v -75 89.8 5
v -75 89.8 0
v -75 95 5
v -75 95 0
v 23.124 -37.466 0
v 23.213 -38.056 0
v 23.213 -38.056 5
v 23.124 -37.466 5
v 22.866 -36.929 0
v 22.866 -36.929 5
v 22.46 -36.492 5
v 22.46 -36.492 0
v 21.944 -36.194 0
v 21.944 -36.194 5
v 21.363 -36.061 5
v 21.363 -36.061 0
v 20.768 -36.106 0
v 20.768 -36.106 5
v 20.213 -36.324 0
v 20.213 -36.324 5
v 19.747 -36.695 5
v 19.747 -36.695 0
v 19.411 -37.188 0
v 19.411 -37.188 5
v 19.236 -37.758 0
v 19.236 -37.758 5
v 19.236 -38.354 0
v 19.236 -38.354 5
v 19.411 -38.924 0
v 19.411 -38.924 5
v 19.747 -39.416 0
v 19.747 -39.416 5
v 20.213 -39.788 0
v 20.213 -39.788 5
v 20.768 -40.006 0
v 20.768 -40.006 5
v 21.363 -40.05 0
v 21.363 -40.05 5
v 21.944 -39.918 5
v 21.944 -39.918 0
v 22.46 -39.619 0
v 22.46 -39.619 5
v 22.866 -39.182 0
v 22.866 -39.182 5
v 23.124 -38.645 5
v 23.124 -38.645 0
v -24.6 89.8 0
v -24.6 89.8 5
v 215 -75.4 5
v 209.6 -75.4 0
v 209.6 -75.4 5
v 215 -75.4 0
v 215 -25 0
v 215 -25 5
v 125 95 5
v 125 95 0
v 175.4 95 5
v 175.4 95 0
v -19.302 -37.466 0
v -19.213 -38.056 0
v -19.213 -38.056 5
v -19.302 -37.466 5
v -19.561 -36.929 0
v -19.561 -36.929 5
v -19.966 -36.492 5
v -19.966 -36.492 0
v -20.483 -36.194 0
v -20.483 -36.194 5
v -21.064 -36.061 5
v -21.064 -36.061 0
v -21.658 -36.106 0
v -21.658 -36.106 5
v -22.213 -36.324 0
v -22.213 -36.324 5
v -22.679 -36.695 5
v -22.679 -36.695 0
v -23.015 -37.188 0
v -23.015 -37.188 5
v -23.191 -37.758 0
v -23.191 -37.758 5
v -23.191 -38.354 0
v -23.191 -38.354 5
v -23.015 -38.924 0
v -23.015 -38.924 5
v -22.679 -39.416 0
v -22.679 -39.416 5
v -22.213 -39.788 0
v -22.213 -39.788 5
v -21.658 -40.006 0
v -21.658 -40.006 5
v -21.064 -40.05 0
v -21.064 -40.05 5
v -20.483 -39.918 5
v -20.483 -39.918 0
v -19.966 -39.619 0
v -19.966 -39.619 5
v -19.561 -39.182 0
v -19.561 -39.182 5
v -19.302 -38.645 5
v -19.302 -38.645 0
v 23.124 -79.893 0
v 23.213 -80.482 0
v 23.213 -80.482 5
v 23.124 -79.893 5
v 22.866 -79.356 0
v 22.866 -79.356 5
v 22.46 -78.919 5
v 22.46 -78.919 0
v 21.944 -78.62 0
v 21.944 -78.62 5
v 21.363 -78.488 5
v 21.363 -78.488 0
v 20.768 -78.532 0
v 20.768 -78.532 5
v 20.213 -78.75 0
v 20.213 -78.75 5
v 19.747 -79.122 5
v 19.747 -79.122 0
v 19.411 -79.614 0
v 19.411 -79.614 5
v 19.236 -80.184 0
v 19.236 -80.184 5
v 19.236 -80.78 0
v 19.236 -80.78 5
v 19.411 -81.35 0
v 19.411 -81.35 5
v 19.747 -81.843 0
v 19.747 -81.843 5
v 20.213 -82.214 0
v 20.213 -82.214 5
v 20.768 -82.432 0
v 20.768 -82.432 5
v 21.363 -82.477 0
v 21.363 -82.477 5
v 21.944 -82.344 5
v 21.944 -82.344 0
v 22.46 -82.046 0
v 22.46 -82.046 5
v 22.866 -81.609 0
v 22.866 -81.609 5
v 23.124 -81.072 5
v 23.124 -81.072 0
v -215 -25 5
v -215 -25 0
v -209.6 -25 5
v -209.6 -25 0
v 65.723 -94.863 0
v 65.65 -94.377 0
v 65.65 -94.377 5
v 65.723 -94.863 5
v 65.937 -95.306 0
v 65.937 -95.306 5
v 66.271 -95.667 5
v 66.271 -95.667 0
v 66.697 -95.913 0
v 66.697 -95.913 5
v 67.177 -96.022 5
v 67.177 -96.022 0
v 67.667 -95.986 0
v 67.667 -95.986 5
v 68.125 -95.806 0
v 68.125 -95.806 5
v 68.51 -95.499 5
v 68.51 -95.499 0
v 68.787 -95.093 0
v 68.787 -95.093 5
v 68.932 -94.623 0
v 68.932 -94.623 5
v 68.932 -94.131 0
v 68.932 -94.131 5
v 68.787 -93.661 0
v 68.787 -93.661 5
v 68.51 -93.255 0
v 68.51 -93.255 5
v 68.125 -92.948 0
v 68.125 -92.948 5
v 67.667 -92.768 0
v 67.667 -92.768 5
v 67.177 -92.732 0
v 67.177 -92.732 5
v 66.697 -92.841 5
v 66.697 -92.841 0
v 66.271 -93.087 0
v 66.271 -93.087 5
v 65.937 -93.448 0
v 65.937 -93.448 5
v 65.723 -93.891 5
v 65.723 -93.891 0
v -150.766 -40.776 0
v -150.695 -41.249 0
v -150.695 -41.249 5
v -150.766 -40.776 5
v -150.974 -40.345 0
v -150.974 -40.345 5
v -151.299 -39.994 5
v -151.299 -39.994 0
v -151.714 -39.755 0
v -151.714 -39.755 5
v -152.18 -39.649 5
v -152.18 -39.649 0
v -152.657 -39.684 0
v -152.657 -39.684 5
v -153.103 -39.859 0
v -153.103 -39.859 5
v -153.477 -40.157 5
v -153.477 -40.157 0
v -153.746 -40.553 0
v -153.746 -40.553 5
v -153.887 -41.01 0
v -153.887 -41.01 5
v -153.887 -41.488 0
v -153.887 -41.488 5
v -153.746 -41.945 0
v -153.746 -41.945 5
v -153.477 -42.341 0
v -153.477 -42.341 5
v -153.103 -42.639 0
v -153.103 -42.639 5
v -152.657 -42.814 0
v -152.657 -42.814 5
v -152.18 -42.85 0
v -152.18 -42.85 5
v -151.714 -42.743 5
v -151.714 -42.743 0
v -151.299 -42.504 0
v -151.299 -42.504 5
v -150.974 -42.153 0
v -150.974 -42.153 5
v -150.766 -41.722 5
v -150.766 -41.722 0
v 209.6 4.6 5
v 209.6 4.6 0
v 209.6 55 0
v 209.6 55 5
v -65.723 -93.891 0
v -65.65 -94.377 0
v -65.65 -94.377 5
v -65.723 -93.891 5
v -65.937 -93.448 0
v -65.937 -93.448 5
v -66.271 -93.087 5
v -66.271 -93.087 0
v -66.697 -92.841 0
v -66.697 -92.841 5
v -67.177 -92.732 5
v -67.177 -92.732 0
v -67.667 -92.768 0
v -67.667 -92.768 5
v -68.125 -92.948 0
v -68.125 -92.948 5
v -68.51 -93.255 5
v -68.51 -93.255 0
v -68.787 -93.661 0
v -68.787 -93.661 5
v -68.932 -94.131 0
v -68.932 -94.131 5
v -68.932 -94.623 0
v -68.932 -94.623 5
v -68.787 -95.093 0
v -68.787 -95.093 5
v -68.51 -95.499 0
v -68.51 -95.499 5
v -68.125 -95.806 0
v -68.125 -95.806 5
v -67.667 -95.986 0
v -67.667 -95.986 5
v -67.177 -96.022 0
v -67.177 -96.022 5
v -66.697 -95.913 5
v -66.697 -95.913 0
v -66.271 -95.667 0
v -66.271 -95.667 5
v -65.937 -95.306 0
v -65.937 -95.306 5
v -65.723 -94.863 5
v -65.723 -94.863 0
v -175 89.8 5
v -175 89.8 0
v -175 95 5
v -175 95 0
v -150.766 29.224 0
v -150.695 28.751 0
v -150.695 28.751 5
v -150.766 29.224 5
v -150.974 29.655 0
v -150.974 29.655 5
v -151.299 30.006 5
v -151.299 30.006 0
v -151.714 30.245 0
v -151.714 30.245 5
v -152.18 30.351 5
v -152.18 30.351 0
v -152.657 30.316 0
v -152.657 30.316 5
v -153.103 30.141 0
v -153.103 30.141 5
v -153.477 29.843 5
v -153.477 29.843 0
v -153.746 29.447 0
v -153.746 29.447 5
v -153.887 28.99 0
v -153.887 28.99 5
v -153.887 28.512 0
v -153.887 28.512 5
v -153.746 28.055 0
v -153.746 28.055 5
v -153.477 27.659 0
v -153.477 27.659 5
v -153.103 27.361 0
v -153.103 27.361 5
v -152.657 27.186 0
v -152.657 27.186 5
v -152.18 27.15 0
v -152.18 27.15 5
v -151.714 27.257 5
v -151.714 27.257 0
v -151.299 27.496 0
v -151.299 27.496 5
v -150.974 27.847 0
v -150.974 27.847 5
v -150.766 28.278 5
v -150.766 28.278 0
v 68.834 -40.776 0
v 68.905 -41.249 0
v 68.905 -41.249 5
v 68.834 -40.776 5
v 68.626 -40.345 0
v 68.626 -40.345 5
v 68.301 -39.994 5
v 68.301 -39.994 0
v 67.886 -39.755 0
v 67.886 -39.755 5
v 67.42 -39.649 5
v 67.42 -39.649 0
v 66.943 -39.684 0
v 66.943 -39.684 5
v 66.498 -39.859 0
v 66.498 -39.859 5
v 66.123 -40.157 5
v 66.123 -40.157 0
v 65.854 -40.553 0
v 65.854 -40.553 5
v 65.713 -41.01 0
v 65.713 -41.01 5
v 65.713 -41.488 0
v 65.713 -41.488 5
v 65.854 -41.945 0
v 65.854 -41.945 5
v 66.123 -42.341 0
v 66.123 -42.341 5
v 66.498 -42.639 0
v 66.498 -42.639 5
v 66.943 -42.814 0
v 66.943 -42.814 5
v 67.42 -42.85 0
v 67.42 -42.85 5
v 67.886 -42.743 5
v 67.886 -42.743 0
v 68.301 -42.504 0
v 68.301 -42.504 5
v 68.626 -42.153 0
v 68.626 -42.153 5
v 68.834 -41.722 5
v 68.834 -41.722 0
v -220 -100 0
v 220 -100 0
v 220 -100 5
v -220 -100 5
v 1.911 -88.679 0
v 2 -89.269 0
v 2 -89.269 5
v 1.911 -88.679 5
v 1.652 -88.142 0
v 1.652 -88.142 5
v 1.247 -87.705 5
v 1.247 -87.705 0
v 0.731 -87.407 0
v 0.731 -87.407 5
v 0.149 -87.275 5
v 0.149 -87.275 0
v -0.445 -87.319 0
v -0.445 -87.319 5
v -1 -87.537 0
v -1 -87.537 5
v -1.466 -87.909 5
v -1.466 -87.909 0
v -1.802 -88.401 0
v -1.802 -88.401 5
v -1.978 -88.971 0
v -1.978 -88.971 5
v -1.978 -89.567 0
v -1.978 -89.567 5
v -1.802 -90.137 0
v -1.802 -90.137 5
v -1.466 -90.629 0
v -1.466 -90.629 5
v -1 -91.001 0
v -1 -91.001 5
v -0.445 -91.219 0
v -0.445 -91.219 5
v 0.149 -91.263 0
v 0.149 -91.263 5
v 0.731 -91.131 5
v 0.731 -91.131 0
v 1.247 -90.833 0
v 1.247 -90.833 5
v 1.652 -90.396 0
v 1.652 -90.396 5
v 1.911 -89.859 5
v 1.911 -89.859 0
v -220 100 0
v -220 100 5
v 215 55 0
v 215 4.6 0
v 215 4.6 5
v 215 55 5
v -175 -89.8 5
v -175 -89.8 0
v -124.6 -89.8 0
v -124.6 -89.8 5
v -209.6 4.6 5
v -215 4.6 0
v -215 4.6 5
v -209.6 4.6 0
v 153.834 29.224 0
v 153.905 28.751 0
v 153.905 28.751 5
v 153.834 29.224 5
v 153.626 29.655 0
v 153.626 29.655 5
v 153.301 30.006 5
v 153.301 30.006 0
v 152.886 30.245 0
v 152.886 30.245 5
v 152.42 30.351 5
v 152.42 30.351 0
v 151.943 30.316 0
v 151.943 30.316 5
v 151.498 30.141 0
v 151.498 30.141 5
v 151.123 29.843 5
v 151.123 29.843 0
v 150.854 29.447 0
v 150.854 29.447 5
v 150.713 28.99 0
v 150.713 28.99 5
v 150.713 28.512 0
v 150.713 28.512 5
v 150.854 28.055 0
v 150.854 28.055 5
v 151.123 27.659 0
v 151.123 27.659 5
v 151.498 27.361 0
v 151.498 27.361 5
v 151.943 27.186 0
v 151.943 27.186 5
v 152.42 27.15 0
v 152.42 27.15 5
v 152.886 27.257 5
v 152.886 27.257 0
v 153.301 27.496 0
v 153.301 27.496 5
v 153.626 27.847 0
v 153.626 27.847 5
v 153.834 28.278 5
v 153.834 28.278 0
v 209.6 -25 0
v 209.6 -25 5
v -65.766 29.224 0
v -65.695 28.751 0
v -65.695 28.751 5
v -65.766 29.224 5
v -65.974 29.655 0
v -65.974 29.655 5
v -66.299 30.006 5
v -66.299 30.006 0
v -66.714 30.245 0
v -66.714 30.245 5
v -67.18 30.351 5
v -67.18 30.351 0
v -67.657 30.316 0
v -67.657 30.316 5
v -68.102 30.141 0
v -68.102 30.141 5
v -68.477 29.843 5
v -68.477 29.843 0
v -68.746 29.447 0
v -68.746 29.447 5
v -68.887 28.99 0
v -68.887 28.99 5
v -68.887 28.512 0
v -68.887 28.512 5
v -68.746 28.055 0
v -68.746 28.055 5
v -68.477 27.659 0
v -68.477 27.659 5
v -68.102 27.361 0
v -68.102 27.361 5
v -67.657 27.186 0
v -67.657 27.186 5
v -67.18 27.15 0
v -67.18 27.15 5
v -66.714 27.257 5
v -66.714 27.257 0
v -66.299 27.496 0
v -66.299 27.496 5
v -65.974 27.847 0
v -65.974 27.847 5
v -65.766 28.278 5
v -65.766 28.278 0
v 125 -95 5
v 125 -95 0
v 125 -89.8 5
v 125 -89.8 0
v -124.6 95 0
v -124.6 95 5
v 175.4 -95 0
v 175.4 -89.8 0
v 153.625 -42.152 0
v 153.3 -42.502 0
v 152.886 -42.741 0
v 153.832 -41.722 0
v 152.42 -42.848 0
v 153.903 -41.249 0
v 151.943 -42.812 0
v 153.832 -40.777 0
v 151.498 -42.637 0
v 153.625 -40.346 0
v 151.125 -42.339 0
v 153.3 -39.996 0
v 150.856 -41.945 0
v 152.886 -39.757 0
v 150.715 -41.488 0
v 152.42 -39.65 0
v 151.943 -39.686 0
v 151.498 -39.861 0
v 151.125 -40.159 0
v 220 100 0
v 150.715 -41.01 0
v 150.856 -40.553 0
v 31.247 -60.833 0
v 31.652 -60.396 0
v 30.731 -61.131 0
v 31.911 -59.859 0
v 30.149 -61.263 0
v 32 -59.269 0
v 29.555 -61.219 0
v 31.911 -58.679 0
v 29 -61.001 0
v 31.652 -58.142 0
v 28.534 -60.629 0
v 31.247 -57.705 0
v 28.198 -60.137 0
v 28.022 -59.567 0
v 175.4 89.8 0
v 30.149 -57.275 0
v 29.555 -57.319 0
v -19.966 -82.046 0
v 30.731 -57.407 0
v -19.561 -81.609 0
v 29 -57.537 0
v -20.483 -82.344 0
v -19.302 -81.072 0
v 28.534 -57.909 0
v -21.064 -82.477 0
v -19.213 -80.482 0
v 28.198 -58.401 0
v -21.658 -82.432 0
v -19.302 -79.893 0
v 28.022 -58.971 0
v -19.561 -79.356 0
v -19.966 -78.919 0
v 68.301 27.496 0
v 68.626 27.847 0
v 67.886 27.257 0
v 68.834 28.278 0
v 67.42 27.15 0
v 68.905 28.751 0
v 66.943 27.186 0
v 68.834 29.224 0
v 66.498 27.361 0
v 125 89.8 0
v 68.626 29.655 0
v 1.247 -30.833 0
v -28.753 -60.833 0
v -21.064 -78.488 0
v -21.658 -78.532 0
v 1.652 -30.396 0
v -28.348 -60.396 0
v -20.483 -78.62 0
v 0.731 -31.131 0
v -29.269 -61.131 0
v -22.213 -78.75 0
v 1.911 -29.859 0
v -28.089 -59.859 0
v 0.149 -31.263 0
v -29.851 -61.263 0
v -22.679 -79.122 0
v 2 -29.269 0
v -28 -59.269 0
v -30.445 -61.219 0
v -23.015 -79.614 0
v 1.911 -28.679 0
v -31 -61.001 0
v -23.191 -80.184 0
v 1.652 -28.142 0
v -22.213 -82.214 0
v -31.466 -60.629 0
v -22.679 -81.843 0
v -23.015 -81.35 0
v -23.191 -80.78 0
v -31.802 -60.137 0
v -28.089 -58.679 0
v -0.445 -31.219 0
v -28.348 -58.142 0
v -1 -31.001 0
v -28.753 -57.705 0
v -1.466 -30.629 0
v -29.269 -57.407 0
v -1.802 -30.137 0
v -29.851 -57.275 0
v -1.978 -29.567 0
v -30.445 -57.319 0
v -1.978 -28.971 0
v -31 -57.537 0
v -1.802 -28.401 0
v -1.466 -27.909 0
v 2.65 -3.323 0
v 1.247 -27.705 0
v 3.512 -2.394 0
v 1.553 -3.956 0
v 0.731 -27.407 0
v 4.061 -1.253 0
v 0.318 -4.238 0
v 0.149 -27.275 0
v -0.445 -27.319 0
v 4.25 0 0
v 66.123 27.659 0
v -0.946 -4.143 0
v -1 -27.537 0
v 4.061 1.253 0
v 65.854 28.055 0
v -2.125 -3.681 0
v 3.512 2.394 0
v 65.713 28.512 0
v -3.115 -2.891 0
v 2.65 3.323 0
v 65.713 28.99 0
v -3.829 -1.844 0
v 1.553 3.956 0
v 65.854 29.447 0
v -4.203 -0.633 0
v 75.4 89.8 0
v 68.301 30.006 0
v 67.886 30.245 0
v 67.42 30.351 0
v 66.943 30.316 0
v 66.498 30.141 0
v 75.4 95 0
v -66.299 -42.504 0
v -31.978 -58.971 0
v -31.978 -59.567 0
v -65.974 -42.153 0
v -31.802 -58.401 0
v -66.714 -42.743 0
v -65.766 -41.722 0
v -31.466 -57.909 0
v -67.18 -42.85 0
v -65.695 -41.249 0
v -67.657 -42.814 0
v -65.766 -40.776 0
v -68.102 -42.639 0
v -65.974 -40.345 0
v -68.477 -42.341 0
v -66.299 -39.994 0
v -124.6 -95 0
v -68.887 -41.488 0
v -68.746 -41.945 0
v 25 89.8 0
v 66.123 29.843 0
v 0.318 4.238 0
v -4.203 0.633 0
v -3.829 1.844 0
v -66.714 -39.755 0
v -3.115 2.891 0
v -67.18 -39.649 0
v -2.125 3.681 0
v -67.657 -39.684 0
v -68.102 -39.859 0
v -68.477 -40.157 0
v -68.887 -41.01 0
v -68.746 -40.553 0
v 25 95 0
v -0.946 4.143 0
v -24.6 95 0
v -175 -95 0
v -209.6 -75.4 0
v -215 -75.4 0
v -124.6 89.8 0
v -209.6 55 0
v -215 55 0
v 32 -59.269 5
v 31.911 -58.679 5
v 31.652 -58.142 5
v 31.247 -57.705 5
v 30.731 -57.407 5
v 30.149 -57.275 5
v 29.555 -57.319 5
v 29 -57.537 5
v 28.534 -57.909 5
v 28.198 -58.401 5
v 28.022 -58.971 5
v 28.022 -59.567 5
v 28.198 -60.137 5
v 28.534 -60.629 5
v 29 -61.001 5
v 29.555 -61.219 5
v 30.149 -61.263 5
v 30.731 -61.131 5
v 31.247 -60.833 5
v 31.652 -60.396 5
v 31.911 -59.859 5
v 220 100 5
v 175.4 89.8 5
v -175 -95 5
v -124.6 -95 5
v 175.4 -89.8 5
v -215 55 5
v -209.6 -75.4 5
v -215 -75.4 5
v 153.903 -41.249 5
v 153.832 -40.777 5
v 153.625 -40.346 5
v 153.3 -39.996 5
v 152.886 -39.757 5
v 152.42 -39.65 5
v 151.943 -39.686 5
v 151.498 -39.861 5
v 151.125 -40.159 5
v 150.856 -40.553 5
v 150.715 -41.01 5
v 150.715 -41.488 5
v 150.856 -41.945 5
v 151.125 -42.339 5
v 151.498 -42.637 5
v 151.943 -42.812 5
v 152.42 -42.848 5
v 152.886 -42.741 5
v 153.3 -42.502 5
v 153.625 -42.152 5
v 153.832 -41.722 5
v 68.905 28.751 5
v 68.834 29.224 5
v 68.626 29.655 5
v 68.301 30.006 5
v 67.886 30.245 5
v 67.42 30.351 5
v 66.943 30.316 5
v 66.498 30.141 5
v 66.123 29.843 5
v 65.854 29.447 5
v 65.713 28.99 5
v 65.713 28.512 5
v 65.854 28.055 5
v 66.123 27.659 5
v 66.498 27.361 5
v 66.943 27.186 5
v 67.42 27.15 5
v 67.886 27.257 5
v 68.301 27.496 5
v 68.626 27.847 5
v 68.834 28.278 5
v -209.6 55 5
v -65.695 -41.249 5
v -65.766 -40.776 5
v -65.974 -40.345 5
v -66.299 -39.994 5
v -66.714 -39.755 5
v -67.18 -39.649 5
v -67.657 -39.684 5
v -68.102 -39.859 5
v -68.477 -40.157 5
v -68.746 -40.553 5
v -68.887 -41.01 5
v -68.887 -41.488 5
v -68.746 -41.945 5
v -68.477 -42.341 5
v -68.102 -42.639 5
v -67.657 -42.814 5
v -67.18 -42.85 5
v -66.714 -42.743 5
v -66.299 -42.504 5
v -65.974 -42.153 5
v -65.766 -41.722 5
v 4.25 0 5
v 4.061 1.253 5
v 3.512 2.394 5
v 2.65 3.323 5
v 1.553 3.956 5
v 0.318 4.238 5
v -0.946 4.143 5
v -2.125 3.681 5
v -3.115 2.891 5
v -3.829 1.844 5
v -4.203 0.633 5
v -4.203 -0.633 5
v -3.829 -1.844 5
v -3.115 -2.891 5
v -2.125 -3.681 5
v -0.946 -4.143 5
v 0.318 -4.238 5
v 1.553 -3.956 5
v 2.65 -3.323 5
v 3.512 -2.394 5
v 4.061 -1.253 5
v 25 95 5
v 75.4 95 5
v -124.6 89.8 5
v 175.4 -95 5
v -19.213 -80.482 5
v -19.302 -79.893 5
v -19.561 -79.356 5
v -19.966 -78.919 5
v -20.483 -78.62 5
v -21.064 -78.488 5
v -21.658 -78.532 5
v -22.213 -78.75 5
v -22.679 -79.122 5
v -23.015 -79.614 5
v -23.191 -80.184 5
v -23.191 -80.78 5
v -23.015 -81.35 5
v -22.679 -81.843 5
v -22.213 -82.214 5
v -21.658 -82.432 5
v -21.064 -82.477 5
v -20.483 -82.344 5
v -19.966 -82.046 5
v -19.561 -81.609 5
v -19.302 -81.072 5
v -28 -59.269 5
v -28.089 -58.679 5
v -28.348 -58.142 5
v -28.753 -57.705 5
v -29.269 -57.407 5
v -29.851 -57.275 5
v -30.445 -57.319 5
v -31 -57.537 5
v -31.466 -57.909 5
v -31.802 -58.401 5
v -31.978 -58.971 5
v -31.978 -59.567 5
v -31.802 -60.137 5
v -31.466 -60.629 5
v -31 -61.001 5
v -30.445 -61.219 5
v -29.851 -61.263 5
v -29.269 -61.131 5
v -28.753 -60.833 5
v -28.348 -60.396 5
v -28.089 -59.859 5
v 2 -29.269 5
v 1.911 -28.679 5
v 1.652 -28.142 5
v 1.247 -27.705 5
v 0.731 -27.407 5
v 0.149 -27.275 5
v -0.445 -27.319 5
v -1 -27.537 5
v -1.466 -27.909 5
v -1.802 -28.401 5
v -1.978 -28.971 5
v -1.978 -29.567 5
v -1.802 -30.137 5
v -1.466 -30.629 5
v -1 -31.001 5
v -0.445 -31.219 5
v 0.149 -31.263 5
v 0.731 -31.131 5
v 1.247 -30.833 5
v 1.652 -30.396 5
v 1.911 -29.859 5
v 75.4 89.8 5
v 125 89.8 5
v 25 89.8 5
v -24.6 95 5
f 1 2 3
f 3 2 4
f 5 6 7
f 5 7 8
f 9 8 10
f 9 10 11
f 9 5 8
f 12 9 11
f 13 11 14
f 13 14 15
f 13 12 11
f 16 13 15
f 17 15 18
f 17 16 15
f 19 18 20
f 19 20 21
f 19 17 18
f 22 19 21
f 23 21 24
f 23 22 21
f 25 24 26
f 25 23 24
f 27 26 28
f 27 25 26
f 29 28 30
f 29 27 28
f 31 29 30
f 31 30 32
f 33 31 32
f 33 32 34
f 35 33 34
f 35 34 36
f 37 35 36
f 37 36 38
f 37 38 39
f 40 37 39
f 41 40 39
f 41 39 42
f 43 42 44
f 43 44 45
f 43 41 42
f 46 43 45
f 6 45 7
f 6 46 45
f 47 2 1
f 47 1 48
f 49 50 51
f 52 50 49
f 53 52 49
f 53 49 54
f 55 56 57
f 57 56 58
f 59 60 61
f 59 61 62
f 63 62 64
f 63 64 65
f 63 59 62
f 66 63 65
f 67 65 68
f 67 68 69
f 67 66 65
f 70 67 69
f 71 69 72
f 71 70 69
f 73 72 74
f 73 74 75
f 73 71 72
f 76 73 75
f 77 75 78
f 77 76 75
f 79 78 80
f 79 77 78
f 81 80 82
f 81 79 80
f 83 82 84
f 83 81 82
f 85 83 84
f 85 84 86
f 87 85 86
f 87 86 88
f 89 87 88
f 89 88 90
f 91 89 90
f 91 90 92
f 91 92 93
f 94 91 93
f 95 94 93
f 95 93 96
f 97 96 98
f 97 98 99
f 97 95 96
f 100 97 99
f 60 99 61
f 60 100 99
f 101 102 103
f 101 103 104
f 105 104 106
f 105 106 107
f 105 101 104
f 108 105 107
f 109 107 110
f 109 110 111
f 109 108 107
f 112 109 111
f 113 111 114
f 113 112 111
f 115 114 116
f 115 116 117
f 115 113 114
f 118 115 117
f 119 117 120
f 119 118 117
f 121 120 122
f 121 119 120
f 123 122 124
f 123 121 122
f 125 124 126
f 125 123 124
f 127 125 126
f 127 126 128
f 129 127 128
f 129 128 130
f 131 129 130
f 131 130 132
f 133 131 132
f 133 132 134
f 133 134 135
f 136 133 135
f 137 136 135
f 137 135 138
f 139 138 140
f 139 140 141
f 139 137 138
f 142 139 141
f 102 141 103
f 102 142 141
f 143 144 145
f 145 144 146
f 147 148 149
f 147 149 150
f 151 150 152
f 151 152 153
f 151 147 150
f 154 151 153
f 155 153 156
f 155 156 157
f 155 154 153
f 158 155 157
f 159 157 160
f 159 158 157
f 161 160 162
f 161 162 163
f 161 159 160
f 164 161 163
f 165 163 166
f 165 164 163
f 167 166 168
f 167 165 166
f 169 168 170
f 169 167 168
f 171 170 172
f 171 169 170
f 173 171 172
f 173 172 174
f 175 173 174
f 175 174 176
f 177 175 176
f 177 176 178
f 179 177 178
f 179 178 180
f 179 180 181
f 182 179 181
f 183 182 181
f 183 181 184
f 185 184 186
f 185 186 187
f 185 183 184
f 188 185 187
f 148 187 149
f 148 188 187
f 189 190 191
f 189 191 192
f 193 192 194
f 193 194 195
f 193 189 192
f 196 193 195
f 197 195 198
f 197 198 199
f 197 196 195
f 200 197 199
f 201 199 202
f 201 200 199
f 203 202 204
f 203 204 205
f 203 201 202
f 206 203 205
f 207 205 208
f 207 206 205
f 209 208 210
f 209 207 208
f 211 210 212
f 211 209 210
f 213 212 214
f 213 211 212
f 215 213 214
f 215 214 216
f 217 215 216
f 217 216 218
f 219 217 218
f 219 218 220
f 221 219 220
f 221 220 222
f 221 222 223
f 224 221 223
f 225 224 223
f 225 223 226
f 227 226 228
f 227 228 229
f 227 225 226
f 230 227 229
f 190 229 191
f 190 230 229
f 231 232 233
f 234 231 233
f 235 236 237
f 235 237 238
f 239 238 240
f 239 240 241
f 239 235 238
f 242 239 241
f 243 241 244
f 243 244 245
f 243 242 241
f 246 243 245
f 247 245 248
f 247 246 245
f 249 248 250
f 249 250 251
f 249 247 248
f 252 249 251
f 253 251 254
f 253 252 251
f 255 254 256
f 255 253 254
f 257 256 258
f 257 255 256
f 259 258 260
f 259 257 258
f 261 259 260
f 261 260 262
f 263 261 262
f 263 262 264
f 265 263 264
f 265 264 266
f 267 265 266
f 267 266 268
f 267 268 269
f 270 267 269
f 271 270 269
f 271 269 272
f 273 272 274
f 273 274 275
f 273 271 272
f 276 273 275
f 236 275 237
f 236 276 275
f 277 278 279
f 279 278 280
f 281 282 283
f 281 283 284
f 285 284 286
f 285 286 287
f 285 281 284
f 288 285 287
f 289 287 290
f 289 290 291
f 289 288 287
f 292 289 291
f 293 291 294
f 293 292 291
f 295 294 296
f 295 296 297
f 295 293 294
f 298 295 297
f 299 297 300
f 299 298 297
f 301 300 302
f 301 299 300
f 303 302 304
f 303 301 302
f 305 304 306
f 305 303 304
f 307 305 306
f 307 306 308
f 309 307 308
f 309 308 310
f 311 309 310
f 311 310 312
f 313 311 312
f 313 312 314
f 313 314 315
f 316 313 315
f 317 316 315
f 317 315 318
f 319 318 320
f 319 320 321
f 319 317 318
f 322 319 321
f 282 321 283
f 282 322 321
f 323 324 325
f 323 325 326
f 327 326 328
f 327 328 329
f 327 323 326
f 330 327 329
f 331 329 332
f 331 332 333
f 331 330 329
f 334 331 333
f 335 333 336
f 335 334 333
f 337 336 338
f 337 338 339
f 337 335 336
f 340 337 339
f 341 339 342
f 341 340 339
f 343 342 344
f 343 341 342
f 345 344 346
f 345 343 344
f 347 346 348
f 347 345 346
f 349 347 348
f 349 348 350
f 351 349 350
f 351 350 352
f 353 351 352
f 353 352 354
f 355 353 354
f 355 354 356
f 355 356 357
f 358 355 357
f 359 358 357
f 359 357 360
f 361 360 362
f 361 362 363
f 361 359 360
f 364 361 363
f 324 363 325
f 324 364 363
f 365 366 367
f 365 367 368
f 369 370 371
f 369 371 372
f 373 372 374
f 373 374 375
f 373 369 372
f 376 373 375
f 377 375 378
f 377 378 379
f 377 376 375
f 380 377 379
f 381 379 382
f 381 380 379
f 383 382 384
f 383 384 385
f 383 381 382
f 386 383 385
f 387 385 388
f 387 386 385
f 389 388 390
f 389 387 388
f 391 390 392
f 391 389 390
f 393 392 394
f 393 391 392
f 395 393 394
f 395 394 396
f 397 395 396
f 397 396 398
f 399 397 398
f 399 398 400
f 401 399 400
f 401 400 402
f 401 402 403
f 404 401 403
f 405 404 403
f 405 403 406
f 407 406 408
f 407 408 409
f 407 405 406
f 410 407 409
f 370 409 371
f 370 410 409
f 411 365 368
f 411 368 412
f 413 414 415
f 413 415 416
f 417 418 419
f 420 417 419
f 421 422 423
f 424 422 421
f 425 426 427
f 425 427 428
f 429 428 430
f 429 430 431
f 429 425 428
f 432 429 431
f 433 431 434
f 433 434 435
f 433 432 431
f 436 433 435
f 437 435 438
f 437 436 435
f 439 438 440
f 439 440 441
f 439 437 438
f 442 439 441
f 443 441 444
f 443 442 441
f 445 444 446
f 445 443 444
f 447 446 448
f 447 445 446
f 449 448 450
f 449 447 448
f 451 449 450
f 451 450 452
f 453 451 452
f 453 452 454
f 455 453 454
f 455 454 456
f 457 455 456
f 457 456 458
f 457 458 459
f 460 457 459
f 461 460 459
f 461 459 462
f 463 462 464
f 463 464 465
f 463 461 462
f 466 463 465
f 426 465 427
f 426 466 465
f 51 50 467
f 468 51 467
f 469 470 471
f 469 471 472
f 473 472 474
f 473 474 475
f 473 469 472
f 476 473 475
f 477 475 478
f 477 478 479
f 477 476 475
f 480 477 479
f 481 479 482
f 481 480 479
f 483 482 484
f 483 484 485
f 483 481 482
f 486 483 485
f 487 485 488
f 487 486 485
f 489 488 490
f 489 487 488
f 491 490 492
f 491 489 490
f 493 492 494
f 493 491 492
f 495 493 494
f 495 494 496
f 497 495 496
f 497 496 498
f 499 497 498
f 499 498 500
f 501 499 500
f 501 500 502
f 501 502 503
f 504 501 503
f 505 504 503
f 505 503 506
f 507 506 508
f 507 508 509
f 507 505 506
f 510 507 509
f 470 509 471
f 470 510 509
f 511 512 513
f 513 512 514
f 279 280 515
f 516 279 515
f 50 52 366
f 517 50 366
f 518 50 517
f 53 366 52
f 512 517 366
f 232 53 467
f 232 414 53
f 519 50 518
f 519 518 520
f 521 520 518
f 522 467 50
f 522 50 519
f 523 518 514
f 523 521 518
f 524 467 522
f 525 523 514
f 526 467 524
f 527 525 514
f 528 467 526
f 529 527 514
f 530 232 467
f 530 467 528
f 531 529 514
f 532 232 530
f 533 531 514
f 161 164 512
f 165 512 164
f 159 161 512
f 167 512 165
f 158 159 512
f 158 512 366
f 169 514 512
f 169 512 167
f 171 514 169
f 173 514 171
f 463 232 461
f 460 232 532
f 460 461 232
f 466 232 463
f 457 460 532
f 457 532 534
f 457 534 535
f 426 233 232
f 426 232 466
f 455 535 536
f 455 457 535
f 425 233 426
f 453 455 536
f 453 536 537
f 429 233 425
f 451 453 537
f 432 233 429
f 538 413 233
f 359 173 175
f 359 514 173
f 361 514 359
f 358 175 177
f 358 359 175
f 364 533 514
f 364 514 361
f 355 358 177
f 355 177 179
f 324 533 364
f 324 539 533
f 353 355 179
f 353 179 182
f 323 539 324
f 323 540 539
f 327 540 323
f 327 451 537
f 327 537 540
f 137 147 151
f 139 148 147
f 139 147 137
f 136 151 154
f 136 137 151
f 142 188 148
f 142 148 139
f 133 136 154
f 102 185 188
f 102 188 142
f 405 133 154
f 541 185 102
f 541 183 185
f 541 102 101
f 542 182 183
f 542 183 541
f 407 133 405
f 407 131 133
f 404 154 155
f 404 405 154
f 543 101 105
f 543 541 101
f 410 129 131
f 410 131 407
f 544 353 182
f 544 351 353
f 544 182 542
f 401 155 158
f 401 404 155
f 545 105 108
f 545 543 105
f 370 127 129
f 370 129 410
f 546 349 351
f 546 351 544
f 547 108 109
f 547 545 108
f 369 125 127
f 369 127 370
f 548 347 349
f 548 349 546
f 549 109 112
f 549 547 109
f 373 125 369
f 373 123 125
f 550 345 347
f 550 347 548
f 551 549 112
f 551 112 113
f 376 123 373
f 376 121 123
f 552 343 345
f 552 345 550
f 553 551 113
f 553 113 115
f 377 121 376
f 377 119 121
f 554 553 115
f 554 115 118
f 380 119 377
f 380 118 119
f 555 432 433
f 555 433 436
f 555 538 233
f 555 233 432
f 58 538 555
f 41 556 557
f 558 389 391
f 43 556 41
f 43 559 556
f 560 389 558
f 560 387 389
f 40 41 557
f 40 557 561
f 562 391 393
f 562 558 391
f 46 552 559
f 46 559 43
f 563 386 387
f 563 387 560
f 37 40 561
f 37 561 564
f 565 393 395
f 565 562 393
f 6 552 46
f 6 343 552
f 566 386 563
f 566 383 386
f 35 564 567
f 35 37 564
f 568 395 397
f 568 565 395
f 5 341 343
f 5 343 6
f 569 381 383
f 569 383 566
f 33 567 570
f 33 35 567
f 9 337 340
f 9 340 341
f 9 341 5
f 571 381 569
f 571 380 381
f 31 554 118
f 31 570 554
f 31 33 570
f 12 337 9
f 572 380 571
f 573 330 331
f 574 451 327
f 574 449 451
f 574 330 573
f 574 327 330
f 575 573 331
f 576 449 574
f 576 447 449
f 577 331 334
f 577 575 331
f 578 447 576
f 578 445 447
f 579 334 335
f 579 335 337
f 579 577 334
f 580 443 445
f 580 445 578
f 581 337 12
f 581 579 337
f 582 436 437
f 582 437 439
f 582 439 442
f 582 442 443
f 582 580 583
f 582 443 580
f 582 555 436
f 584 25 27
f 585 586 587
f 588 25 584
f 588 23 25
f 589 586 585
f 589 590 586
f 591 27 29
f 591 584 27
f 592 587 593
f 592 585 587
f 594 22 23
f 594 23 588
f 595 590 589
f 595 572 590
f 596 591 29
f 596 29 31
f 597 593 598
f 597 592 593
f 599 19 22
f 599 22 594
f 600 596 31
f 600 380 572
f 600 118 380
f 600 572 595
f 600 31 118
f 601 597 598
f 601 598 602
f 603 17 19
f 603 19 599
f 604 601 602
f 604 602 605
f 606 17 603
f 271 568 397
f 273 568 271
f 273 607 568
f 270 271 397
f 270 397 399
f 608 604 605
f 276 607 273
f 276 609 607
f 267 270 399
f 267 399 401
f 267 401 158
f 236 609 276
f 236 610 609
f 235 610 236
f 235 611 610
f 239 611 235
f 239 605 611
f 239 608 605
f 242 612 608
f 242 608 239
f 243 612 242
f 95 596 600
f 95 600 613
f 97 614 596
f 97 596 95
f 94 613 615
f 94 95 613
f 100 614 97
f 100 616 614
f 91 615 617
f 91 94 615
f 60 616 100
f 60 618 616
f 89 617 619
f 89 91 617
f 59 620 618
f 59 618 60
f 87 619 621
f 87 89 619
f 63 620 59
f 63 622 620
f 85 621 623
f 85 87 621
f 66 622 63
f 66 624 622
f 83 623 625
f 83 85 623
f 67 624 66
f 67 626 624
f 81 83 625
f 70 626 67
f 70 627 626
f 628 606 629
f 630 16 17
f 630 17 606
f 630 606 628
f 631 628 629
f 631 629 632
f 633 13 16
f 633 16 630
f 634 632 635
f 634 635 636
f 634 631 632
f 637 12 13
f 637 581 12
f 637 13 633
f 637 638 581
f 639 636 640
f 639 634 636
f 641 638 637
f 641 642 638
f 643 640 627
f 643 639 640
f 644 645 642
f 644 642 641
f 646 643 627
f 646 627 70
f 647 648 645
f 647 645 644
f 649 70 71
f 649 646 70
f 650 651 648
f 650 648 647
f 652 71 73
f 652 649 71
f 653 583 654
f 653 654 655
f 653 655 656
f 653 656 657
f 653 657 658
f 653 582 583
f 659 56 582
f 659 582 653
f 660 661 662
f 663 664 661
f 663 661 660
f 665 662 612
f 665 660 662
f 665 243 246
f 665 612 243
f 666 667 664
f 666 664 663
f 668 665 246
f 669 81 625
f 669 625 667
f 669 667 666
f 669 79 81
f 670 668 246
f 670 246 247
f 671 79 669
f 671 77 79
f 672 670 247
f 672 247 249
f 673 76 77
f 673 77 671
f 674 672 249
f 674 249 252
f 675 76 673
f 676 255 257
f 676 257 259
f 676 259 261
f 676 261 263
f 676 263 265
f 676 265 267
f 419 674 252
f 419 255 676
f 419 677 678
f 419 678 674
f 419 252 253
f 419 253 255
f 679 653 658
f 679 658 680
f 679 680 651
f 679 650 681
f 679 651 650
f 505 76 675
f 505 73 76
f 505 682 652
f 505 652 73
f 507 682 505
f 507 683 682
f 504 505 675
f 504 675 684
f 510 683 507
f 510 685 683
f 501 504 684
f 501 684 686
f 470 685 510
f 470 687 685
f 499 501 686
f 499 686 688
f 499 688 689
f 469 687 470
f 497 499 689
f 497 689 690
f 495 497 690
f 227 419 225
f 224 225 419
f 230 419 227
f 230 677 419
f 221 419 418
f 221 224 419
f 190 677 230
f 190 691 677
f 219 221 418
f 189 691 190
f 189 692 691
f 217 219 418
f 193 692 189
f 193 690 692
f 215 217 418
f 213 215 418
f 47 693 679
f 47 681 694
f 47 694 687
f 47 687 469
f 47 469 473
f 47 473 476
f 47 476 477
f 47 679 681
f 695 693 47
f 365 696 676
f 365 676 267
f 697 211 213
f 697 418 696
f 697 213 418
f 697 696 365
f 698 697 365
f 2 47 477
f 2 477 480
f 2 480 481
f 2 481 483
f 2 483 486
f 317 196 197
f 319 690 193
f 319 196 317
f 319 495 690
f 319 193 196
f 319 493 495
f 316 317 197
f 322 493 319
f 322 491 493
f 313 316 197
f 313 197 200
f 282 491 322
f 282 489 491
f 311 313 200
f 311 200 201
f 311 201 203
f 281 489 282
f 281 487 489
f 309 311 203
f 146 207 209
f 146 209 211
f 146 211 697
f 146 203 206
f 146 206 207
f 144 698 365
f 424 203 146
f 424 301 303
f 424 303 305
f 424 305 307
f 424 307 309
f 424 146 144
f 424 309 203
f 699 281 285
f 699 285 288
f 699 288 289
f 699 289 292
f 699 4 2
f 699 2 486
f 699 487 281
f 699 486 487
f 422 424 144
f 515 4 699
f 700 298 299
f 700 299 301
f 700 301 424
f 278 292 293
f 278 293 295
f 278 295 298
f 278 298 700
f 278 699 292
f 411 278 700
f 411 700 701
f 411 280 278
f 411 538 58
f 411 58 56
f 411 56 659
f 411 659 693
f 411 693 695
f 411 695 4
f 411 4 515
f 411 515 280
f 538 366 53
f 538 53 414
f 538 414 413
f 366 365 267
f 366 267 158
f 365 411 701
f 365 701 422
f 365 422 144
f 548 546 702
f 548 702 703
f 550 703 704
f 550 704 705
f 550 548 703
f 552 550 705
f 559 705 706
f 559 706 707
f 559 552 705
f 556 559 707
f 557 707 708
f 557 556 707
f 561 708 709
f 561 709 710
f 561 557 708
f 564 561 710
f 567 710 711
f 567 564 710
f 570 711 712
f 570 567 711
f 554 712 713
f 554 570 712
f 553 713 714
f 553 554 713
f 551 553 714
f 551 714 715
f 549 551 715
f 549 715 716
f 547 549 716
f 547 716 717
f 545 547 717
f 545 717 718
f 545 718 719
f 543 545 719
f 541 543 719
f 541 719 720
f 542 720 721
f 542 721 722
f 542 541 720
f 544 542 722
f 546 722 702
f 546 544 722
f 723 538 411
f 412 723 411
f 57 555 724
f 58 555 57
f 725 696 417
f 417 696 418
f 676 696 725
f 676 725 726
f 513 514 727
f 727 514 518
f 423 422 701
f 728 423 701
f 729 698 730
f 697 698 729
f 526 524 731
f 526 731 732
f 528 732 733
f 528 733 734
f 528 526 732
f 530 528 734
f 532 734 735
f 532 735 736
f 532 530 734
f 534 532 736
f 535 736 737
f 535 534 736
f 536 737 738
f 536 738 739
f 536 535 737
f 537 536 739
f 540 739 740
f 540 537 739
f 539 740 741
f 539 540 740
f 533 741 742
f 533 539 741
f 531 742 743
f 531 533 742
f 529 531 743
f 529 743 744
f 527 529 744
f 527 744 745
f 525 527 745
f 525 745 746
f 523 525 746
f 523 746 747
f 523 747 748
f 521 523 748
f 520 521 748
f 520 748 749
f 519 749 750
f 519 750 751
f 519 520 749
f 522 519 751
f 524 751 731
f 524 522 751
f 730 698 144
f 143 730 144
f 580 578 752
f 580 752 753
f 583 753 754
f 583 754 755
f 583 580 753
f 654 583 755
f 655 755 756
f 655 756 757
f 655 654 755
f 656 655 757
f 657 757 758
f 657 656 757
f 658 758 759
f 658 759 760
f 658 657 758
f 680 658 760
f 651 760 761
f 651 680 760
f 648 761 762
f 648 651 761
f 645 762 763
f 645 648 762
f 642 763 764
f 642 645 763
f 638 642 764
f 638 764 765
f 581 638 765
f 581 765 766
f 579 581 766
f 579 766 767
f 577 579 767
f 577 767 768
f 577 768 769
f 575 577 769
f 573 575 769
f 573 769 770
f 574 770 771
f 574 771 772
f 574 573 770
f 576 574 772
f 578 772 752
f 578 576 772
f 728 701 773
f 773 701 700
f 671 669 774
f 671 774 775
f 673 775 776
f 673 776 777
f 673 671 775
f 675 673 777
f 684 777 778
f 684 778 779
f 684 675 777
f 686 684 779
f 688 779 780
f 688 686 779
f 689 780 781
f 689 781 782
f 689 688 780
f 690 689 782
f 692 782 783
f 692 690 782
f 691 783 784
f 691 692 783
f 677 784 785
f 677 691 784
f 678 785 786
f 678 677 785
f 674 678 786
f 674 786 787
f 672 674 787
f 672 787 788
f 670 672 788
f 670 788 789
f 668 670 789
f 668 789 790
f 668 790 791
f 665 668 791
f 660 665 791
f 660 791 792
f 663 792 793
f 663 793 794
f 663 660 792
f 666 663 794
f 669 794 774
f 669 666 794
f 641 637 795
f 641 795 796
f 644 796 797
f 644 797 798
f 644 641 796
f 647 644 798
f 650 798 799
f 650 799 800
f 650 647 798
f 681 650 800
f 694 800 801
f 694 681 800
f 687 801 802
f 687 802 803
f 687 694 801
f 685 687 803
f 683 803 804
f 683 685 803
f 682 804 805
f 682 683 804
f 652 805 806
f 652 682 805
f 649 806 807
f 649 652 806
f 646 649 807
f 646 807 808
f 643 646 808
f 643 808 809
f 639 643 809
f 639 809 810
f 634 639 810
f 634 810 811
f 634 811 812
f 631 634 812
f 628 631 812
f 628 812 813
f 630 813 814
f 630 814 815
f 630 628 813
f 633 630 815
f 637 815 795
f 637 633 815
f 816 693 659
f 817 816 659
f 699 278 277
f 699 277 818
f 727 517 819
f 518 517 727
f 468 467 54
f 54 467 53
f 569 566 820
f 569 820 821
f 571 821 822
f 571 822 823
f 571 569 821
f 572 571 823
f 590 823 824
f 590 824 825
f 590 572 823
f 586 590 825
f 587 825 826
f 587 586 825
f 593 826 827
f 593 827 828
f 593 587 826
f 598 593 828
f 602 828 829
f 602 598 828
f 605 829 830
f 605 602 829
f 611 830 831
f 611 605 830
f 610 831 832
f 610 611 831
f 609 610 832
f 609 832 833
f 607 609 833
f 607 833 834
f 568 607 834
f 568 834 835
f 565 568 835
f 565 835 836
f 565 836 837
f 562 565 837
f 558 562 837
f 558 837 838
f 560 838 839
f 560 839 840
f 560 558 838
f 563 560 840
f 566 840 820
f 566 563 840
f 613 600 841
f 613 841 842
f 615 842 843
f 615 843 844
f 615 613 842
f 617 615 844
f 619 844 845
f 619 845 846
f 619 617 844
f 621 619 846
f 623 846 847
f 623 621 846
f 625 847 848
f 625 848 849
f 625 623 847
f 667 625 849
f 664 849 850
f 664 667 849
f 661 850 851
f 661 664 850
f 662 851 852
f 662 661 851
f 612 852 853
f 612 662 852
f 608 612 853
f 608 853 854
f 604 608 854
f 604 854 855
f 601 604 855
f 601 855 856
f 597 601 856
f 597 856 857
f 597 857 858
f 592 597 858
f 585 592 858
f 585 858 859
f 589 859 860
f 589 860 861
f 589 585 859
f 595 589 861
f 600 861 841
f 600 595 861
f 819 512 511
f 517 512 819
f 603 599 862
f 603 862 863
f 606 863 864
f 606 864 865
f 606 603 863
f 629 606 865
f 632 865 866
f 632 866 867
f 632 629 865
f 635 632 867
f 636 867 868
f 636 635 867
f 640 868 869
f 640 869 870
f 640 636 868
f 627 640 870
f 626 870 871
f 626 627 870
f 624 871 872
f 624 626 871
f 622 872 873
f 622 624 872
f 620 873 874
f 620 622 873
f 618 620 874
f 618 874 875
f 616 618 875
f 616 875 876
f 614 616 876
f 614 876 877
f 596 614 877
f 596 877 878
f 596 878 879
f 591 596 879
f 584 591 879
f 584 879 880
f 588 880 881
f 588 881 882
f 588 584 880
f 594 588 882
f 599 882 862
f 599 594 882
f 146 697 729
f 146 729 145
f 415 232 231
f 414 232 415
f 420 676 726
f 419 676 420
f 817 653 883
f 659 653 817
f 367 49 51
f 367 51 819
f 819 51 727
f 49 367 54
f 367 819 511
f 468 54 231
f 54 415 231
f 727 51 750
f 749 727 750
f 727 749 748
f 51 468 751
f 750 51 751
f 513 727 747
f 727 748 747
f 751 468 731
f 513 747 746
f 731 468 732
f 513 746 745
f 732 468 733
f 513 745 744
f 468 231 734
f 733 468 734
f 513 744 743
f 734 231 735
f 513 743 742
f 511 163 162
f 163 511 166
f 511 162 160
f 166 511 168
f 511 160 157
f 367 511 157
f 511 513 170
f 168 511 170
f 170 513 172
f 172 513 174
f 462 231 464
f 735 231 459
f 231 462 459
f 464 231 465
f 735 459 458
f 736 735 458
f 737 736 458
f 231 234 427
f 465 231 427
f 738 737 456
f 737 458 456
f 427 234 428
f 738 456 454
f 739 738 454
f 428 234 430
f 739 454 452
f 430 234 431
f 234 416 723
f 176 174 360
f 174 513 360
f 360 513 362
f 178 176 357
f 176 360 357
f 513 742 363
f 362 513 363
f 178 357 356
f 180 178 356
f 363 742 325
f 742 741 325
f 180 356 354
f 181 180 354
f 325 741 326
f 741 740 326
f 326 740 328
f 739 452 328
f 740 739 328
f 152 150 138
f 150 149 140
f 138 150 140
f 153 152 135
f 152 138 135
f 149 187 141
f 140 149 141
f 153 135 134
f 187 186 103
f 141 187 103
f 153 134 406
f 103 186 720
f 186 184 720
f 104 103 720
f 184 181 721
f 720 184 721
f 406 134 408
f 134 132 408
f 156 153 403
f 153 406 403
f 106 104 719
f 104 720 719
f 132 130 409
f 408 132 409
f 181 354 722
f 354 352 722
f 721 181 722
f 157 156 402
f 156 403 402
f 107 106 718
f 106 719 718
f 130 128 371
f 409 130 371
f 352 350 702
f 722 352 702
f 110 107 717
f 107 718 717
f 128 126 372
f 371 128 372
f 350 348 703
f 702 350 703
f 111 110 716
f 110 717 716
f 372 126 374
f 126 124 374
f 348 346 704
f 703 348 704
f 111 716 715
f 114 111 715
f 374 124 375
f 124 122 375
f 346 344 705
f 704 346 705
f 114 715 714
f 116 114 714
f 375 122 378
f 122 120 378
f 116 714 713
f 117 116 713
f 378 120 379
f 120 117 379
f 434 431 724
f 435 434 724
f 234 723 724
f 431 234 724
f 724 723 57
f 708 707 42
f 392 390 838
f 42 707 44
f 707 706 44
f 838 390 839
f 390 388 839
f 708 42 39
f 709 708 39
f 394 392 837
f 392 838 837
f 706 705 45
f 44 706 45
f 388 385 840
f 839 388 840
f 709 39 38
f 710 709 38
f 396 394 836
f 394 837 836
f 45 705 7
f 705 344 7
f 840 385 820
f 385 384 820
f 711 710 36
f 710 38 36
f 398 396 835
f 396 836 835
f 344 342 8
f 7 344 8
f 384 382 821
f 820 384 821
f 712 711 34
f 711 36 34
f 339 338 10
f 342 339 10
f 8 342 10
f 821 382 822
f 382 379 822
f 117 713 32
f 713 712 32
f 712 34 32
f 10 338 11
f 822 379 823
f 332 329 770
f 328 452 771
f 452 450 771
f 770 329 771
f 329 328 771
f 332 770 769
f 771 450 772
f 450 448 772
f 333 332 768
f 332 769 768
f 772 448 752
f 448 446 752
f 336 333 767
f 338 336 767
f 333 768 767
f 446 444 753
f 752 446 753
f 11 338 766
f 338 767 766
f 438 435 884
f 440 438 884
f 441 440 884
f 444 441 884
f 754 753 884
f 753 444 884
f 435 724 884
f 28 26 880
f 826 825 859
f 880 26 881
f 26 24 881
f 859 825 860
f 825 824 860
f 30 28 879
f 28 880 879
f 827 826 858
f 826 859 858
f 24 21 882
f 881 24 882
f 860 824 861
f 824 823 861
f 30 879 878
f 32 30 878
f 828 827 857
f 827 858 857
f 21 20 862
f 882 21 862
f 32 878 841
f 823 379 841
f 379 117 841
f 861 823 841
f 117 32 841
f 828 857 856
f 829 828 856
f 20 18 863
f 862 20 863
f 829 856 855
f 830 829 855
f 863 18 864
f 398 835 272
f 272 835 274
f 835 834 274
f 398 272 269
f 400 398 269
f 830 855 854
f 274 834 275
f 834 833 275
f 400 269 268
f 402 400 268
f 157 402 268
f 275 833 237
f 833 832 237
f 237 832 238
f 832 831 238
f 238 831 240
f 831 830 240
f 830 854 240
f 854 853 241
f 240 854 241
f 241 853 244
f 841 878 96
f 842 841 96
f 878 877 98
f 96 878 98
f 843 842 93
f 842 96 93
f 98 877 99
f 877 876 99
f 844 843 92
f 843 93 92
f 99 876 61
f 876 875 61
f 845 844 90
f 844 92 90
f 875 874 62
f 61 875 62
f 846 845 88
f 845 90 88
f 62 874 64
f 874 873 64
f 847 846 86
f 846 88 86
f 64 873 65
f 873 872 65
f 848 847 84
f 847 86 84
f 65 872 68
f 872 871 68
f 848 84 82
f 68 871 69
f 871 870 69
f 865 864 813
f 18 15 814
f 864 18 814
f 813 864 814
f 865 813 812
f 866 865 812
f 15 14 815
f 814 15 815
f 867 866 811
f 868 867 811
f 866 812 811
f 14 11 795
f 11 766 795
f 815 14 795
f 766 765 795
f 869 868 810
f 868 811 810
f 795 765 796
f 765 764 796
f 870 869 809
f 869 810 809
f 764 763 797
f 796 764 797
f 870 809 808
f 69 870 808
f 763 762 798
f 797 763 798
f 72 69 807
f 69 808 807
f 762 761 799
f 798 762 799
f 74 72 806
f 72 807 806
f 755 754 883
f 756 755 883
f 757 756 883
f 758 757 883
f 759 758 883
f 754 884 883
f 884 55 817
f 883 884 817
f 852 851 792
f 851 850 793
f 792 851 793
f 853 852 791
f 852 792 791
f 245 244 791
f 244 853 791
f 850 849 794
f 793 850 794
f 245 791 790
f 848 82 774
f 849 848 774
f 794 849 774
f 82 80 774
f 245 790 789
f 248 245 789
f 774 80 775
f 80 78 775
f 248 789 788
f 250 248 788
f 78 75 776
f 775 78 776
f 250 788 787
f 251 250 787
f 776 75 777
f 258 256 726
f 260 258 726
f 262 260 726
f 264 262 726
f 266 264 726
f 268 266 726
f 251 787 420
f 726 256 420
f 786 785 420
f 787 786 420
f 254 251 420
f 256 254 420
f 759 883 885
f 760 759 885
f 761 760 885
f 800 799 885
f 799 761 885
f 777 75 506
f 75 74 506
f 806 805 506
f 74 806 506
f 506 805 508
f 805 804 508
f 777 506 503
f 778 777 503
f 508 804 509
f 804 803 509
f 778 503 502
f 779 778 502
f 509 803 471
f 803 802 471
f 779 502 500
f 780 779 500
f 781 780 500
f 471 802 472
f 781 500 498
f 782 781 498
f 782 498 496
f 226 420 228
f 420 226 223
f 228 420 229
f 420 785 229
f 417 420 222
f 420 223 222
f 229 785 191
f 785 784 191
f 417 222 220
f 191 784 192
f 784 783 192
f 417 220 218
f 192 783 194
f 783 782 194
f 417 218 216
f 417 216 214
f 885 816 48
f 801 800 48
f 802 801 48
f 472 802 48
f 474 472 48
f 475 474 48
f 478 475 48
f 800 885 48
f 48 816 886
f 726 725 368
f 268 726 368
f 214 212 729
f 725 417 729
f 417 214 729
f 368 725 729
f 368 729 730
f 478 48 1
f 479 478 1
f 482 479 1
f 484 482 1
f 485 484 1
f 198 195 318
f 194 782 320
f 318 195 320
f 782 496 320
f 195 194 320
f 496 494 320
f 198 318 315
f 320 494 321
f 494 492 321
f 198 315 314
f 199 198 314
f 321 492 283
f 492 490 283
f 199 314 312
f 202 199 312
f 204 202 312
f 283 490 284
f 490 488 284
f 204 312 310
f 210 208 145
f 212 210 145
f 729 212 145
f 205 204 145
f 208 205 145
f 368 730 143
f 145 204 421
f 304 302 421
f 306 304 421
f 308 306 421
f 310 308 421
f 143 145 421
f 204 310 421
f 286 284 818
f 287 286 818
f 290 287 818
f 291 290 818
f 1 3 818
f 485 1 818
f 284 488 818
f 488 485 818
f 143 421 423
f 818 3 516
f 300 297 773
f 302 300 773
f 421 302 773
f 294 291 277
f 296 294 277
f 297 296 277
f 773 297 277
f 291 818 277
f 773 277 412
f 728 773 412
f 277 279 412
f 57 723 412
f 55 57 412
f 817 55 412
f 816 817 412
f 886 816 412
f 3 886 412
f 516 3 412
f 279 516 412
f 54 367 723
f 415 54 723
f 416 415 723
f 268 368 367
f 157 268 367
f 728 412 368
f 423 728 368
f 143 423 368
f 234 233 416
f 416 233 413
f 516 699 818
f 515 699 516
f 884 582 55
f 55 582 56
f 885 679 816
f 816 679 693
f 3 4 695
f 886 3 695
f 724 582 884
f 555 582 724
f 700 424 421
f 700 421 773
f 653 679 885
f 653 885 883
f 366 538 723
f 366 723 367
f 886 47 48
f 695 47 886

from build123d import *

# Parameters (mm, degrees)
ESQUISSE1_R        = 1.65
ESQUISSE1_R_2      = 1.603139346
ESQUISSE1_R_3      = 1.605
ESQUISSE1_R_4      = 4.25
ESQUISSE1_R_5      = 2
ESQUISSE1_W        = 50.4
ESQUISSE1_H        = 5.2
ESQUISSE1_W_2      = 5.4
ESQUISSE1_H_2      = 50.4
BOSS_EXTRU_1_DEPTH = 5


with BuildPart() as part:
    # Esquisse1 → Boss.-Extru.1 (new body)
    with BuildSketch(Plane.XY):
        Polygon((-220, 100), (-0.145812859, 100), (9.854187141, 100), (220, 100), (220, -100), (-220, -100), align=None)
        with Locations((-67.3, -94.376990981)):
            Circle(ESQUISSE1_R, mode=Mode.SUBTRACT)
        with Locations(Location((67.3, -94.376990981, 0), (0, 0, 180))):
            Circle(ESQUISSE1_R, mode=Mode.SUBTRACT)
        with Locations((152.3, -41.249056917)):
            Circle(ESQUISSE1_R_2, mode=Mode.SUBTRACT)
        with Locations((152.3, 28.750943083)):
            Circle(ESQUISSE1_R_3, mode=Mode.SUBTRACT)
        with Locations((67.3, 28.750943083)):
            Circle(ESQUISSE1_R_3, mode=Mode.SUBTRACT)
        with Locations((67.3, -41.249056917)):
            Circle(ESQUISSE1_R_3, mode=Mode.SUBTRACT)
        with Locations((-67.3, 28.750943083)):
            Circle(ESQUISSE1_R_3, mode=Mode.SUBTRACT)
        with Locations((-67.3, -41.249056917)):
            Circle(ESQUISSE1_R_3, mode=Mode.SUBTRACT)
        with Locations((-152.3, 28.750943083)):
            Circle(ESQUISSE1_R_3, mode=Mode.SUBTRACT)
        with Locations((-152.3, -41.249056917)):
            Circle(ESQUISSE1_R_3, mode=Mode.SUBTRACT)
        Circle(ESQUISSE1_R_4, mode=Mode.SUBTRACT)
        with Locations((0, -29.269007759)):
            Circle(ESQUISSE1_R_5, mode=Mode.SUBTRACT)
        with Locations((21.213203436, -38.055804324)):
            Circle(ESQUISSE1_R_5, mode=Mode.SUBTRACT)
        with Locations((30, -59.269007759)):
            Circle(ESQUISSE1_R_5, mode=Mode.SUBTRACT)
        with Locations((21.213203436, -80.482211195)):
            Circle(ESQUISSE1_R_5, mode=Mode.SUBTRACT)
        with Locations((0, -89.269007759)):
            Circle(ESQUISSE1_R_5, mode=Mode.SUBTRACT)
        with Locations((-21.213203436, -80.482211195)):
            Circle(ESQUISSE1_R_5, mode=Mode.SUBTRACT)
        with Locations((-30, -59.269007759)):
            Circle(ESQUISSE1_R_5, mode=Mode.SUBTRACT)
        with Locations((-21.213203436, -38.055804324)):
            Circle(ESQUISSE1_R_5, mode=Mode.SUBTRACT)
        with Locations((-49.8, 92.4)):
            Rectangle(ESQUISSE1_W, ESQUISSE1_H, mode=Mode.SUBTRACT)
        with Locations((-149.8, 92.4)):
            Rectangle(ESQUISSE1_W, ESQUISSE1_H, mode=Mode.SUBTRACT)
        with Locations((50.2, 92.4)):
            Rectangle(ESQUISSE1_W, ESQUISSE1_H, mode=Mode.SUBTRACT)
        with Locations((150.2, 92.4)):
            Rectangle(ESQUISSE1_W, ESQUISSE1_H, mode=Mode.SUBTRACT)
        with Locations((-212.3, -50.2)):
            Rectangle(ESQUISSE1_W_2, ESQUISSE1_H_2, mode=Mode.SUBTRACT)
        with Locations((-212.3, 29.8)):
            Rectangle(ESQUISSE1_W_2, ESQUISSE1_H_2, mode=Mode.SUBTRACT)
        with Locations((212.3, -50.2)):
            Rectangle(ESQUISSE1_W_2, ESQUISSE1_H_2, mode=Mode.SUBTRACT)
        with Locations((212.3, 29.8)):
            Rectangle(ESQUISSE1_W_2, ESQUISSE1_H_2, mode=Mode.SUBTRACT)
        with Locations((150.2, -92.4)):
            Rectangle(ESQUISSE1_W, ESQUISSE1_H, mode=Mode.SUBTRACT)
        with Locations((-149.8, -92.4)):
            Rectangle(ESQUISSE1_W, ESQUISSE1_H, mode=Mode.SUBTRACT)
    extrude(amount=BOSS_EXTRU_1_DEPTH)


solid = part.part
